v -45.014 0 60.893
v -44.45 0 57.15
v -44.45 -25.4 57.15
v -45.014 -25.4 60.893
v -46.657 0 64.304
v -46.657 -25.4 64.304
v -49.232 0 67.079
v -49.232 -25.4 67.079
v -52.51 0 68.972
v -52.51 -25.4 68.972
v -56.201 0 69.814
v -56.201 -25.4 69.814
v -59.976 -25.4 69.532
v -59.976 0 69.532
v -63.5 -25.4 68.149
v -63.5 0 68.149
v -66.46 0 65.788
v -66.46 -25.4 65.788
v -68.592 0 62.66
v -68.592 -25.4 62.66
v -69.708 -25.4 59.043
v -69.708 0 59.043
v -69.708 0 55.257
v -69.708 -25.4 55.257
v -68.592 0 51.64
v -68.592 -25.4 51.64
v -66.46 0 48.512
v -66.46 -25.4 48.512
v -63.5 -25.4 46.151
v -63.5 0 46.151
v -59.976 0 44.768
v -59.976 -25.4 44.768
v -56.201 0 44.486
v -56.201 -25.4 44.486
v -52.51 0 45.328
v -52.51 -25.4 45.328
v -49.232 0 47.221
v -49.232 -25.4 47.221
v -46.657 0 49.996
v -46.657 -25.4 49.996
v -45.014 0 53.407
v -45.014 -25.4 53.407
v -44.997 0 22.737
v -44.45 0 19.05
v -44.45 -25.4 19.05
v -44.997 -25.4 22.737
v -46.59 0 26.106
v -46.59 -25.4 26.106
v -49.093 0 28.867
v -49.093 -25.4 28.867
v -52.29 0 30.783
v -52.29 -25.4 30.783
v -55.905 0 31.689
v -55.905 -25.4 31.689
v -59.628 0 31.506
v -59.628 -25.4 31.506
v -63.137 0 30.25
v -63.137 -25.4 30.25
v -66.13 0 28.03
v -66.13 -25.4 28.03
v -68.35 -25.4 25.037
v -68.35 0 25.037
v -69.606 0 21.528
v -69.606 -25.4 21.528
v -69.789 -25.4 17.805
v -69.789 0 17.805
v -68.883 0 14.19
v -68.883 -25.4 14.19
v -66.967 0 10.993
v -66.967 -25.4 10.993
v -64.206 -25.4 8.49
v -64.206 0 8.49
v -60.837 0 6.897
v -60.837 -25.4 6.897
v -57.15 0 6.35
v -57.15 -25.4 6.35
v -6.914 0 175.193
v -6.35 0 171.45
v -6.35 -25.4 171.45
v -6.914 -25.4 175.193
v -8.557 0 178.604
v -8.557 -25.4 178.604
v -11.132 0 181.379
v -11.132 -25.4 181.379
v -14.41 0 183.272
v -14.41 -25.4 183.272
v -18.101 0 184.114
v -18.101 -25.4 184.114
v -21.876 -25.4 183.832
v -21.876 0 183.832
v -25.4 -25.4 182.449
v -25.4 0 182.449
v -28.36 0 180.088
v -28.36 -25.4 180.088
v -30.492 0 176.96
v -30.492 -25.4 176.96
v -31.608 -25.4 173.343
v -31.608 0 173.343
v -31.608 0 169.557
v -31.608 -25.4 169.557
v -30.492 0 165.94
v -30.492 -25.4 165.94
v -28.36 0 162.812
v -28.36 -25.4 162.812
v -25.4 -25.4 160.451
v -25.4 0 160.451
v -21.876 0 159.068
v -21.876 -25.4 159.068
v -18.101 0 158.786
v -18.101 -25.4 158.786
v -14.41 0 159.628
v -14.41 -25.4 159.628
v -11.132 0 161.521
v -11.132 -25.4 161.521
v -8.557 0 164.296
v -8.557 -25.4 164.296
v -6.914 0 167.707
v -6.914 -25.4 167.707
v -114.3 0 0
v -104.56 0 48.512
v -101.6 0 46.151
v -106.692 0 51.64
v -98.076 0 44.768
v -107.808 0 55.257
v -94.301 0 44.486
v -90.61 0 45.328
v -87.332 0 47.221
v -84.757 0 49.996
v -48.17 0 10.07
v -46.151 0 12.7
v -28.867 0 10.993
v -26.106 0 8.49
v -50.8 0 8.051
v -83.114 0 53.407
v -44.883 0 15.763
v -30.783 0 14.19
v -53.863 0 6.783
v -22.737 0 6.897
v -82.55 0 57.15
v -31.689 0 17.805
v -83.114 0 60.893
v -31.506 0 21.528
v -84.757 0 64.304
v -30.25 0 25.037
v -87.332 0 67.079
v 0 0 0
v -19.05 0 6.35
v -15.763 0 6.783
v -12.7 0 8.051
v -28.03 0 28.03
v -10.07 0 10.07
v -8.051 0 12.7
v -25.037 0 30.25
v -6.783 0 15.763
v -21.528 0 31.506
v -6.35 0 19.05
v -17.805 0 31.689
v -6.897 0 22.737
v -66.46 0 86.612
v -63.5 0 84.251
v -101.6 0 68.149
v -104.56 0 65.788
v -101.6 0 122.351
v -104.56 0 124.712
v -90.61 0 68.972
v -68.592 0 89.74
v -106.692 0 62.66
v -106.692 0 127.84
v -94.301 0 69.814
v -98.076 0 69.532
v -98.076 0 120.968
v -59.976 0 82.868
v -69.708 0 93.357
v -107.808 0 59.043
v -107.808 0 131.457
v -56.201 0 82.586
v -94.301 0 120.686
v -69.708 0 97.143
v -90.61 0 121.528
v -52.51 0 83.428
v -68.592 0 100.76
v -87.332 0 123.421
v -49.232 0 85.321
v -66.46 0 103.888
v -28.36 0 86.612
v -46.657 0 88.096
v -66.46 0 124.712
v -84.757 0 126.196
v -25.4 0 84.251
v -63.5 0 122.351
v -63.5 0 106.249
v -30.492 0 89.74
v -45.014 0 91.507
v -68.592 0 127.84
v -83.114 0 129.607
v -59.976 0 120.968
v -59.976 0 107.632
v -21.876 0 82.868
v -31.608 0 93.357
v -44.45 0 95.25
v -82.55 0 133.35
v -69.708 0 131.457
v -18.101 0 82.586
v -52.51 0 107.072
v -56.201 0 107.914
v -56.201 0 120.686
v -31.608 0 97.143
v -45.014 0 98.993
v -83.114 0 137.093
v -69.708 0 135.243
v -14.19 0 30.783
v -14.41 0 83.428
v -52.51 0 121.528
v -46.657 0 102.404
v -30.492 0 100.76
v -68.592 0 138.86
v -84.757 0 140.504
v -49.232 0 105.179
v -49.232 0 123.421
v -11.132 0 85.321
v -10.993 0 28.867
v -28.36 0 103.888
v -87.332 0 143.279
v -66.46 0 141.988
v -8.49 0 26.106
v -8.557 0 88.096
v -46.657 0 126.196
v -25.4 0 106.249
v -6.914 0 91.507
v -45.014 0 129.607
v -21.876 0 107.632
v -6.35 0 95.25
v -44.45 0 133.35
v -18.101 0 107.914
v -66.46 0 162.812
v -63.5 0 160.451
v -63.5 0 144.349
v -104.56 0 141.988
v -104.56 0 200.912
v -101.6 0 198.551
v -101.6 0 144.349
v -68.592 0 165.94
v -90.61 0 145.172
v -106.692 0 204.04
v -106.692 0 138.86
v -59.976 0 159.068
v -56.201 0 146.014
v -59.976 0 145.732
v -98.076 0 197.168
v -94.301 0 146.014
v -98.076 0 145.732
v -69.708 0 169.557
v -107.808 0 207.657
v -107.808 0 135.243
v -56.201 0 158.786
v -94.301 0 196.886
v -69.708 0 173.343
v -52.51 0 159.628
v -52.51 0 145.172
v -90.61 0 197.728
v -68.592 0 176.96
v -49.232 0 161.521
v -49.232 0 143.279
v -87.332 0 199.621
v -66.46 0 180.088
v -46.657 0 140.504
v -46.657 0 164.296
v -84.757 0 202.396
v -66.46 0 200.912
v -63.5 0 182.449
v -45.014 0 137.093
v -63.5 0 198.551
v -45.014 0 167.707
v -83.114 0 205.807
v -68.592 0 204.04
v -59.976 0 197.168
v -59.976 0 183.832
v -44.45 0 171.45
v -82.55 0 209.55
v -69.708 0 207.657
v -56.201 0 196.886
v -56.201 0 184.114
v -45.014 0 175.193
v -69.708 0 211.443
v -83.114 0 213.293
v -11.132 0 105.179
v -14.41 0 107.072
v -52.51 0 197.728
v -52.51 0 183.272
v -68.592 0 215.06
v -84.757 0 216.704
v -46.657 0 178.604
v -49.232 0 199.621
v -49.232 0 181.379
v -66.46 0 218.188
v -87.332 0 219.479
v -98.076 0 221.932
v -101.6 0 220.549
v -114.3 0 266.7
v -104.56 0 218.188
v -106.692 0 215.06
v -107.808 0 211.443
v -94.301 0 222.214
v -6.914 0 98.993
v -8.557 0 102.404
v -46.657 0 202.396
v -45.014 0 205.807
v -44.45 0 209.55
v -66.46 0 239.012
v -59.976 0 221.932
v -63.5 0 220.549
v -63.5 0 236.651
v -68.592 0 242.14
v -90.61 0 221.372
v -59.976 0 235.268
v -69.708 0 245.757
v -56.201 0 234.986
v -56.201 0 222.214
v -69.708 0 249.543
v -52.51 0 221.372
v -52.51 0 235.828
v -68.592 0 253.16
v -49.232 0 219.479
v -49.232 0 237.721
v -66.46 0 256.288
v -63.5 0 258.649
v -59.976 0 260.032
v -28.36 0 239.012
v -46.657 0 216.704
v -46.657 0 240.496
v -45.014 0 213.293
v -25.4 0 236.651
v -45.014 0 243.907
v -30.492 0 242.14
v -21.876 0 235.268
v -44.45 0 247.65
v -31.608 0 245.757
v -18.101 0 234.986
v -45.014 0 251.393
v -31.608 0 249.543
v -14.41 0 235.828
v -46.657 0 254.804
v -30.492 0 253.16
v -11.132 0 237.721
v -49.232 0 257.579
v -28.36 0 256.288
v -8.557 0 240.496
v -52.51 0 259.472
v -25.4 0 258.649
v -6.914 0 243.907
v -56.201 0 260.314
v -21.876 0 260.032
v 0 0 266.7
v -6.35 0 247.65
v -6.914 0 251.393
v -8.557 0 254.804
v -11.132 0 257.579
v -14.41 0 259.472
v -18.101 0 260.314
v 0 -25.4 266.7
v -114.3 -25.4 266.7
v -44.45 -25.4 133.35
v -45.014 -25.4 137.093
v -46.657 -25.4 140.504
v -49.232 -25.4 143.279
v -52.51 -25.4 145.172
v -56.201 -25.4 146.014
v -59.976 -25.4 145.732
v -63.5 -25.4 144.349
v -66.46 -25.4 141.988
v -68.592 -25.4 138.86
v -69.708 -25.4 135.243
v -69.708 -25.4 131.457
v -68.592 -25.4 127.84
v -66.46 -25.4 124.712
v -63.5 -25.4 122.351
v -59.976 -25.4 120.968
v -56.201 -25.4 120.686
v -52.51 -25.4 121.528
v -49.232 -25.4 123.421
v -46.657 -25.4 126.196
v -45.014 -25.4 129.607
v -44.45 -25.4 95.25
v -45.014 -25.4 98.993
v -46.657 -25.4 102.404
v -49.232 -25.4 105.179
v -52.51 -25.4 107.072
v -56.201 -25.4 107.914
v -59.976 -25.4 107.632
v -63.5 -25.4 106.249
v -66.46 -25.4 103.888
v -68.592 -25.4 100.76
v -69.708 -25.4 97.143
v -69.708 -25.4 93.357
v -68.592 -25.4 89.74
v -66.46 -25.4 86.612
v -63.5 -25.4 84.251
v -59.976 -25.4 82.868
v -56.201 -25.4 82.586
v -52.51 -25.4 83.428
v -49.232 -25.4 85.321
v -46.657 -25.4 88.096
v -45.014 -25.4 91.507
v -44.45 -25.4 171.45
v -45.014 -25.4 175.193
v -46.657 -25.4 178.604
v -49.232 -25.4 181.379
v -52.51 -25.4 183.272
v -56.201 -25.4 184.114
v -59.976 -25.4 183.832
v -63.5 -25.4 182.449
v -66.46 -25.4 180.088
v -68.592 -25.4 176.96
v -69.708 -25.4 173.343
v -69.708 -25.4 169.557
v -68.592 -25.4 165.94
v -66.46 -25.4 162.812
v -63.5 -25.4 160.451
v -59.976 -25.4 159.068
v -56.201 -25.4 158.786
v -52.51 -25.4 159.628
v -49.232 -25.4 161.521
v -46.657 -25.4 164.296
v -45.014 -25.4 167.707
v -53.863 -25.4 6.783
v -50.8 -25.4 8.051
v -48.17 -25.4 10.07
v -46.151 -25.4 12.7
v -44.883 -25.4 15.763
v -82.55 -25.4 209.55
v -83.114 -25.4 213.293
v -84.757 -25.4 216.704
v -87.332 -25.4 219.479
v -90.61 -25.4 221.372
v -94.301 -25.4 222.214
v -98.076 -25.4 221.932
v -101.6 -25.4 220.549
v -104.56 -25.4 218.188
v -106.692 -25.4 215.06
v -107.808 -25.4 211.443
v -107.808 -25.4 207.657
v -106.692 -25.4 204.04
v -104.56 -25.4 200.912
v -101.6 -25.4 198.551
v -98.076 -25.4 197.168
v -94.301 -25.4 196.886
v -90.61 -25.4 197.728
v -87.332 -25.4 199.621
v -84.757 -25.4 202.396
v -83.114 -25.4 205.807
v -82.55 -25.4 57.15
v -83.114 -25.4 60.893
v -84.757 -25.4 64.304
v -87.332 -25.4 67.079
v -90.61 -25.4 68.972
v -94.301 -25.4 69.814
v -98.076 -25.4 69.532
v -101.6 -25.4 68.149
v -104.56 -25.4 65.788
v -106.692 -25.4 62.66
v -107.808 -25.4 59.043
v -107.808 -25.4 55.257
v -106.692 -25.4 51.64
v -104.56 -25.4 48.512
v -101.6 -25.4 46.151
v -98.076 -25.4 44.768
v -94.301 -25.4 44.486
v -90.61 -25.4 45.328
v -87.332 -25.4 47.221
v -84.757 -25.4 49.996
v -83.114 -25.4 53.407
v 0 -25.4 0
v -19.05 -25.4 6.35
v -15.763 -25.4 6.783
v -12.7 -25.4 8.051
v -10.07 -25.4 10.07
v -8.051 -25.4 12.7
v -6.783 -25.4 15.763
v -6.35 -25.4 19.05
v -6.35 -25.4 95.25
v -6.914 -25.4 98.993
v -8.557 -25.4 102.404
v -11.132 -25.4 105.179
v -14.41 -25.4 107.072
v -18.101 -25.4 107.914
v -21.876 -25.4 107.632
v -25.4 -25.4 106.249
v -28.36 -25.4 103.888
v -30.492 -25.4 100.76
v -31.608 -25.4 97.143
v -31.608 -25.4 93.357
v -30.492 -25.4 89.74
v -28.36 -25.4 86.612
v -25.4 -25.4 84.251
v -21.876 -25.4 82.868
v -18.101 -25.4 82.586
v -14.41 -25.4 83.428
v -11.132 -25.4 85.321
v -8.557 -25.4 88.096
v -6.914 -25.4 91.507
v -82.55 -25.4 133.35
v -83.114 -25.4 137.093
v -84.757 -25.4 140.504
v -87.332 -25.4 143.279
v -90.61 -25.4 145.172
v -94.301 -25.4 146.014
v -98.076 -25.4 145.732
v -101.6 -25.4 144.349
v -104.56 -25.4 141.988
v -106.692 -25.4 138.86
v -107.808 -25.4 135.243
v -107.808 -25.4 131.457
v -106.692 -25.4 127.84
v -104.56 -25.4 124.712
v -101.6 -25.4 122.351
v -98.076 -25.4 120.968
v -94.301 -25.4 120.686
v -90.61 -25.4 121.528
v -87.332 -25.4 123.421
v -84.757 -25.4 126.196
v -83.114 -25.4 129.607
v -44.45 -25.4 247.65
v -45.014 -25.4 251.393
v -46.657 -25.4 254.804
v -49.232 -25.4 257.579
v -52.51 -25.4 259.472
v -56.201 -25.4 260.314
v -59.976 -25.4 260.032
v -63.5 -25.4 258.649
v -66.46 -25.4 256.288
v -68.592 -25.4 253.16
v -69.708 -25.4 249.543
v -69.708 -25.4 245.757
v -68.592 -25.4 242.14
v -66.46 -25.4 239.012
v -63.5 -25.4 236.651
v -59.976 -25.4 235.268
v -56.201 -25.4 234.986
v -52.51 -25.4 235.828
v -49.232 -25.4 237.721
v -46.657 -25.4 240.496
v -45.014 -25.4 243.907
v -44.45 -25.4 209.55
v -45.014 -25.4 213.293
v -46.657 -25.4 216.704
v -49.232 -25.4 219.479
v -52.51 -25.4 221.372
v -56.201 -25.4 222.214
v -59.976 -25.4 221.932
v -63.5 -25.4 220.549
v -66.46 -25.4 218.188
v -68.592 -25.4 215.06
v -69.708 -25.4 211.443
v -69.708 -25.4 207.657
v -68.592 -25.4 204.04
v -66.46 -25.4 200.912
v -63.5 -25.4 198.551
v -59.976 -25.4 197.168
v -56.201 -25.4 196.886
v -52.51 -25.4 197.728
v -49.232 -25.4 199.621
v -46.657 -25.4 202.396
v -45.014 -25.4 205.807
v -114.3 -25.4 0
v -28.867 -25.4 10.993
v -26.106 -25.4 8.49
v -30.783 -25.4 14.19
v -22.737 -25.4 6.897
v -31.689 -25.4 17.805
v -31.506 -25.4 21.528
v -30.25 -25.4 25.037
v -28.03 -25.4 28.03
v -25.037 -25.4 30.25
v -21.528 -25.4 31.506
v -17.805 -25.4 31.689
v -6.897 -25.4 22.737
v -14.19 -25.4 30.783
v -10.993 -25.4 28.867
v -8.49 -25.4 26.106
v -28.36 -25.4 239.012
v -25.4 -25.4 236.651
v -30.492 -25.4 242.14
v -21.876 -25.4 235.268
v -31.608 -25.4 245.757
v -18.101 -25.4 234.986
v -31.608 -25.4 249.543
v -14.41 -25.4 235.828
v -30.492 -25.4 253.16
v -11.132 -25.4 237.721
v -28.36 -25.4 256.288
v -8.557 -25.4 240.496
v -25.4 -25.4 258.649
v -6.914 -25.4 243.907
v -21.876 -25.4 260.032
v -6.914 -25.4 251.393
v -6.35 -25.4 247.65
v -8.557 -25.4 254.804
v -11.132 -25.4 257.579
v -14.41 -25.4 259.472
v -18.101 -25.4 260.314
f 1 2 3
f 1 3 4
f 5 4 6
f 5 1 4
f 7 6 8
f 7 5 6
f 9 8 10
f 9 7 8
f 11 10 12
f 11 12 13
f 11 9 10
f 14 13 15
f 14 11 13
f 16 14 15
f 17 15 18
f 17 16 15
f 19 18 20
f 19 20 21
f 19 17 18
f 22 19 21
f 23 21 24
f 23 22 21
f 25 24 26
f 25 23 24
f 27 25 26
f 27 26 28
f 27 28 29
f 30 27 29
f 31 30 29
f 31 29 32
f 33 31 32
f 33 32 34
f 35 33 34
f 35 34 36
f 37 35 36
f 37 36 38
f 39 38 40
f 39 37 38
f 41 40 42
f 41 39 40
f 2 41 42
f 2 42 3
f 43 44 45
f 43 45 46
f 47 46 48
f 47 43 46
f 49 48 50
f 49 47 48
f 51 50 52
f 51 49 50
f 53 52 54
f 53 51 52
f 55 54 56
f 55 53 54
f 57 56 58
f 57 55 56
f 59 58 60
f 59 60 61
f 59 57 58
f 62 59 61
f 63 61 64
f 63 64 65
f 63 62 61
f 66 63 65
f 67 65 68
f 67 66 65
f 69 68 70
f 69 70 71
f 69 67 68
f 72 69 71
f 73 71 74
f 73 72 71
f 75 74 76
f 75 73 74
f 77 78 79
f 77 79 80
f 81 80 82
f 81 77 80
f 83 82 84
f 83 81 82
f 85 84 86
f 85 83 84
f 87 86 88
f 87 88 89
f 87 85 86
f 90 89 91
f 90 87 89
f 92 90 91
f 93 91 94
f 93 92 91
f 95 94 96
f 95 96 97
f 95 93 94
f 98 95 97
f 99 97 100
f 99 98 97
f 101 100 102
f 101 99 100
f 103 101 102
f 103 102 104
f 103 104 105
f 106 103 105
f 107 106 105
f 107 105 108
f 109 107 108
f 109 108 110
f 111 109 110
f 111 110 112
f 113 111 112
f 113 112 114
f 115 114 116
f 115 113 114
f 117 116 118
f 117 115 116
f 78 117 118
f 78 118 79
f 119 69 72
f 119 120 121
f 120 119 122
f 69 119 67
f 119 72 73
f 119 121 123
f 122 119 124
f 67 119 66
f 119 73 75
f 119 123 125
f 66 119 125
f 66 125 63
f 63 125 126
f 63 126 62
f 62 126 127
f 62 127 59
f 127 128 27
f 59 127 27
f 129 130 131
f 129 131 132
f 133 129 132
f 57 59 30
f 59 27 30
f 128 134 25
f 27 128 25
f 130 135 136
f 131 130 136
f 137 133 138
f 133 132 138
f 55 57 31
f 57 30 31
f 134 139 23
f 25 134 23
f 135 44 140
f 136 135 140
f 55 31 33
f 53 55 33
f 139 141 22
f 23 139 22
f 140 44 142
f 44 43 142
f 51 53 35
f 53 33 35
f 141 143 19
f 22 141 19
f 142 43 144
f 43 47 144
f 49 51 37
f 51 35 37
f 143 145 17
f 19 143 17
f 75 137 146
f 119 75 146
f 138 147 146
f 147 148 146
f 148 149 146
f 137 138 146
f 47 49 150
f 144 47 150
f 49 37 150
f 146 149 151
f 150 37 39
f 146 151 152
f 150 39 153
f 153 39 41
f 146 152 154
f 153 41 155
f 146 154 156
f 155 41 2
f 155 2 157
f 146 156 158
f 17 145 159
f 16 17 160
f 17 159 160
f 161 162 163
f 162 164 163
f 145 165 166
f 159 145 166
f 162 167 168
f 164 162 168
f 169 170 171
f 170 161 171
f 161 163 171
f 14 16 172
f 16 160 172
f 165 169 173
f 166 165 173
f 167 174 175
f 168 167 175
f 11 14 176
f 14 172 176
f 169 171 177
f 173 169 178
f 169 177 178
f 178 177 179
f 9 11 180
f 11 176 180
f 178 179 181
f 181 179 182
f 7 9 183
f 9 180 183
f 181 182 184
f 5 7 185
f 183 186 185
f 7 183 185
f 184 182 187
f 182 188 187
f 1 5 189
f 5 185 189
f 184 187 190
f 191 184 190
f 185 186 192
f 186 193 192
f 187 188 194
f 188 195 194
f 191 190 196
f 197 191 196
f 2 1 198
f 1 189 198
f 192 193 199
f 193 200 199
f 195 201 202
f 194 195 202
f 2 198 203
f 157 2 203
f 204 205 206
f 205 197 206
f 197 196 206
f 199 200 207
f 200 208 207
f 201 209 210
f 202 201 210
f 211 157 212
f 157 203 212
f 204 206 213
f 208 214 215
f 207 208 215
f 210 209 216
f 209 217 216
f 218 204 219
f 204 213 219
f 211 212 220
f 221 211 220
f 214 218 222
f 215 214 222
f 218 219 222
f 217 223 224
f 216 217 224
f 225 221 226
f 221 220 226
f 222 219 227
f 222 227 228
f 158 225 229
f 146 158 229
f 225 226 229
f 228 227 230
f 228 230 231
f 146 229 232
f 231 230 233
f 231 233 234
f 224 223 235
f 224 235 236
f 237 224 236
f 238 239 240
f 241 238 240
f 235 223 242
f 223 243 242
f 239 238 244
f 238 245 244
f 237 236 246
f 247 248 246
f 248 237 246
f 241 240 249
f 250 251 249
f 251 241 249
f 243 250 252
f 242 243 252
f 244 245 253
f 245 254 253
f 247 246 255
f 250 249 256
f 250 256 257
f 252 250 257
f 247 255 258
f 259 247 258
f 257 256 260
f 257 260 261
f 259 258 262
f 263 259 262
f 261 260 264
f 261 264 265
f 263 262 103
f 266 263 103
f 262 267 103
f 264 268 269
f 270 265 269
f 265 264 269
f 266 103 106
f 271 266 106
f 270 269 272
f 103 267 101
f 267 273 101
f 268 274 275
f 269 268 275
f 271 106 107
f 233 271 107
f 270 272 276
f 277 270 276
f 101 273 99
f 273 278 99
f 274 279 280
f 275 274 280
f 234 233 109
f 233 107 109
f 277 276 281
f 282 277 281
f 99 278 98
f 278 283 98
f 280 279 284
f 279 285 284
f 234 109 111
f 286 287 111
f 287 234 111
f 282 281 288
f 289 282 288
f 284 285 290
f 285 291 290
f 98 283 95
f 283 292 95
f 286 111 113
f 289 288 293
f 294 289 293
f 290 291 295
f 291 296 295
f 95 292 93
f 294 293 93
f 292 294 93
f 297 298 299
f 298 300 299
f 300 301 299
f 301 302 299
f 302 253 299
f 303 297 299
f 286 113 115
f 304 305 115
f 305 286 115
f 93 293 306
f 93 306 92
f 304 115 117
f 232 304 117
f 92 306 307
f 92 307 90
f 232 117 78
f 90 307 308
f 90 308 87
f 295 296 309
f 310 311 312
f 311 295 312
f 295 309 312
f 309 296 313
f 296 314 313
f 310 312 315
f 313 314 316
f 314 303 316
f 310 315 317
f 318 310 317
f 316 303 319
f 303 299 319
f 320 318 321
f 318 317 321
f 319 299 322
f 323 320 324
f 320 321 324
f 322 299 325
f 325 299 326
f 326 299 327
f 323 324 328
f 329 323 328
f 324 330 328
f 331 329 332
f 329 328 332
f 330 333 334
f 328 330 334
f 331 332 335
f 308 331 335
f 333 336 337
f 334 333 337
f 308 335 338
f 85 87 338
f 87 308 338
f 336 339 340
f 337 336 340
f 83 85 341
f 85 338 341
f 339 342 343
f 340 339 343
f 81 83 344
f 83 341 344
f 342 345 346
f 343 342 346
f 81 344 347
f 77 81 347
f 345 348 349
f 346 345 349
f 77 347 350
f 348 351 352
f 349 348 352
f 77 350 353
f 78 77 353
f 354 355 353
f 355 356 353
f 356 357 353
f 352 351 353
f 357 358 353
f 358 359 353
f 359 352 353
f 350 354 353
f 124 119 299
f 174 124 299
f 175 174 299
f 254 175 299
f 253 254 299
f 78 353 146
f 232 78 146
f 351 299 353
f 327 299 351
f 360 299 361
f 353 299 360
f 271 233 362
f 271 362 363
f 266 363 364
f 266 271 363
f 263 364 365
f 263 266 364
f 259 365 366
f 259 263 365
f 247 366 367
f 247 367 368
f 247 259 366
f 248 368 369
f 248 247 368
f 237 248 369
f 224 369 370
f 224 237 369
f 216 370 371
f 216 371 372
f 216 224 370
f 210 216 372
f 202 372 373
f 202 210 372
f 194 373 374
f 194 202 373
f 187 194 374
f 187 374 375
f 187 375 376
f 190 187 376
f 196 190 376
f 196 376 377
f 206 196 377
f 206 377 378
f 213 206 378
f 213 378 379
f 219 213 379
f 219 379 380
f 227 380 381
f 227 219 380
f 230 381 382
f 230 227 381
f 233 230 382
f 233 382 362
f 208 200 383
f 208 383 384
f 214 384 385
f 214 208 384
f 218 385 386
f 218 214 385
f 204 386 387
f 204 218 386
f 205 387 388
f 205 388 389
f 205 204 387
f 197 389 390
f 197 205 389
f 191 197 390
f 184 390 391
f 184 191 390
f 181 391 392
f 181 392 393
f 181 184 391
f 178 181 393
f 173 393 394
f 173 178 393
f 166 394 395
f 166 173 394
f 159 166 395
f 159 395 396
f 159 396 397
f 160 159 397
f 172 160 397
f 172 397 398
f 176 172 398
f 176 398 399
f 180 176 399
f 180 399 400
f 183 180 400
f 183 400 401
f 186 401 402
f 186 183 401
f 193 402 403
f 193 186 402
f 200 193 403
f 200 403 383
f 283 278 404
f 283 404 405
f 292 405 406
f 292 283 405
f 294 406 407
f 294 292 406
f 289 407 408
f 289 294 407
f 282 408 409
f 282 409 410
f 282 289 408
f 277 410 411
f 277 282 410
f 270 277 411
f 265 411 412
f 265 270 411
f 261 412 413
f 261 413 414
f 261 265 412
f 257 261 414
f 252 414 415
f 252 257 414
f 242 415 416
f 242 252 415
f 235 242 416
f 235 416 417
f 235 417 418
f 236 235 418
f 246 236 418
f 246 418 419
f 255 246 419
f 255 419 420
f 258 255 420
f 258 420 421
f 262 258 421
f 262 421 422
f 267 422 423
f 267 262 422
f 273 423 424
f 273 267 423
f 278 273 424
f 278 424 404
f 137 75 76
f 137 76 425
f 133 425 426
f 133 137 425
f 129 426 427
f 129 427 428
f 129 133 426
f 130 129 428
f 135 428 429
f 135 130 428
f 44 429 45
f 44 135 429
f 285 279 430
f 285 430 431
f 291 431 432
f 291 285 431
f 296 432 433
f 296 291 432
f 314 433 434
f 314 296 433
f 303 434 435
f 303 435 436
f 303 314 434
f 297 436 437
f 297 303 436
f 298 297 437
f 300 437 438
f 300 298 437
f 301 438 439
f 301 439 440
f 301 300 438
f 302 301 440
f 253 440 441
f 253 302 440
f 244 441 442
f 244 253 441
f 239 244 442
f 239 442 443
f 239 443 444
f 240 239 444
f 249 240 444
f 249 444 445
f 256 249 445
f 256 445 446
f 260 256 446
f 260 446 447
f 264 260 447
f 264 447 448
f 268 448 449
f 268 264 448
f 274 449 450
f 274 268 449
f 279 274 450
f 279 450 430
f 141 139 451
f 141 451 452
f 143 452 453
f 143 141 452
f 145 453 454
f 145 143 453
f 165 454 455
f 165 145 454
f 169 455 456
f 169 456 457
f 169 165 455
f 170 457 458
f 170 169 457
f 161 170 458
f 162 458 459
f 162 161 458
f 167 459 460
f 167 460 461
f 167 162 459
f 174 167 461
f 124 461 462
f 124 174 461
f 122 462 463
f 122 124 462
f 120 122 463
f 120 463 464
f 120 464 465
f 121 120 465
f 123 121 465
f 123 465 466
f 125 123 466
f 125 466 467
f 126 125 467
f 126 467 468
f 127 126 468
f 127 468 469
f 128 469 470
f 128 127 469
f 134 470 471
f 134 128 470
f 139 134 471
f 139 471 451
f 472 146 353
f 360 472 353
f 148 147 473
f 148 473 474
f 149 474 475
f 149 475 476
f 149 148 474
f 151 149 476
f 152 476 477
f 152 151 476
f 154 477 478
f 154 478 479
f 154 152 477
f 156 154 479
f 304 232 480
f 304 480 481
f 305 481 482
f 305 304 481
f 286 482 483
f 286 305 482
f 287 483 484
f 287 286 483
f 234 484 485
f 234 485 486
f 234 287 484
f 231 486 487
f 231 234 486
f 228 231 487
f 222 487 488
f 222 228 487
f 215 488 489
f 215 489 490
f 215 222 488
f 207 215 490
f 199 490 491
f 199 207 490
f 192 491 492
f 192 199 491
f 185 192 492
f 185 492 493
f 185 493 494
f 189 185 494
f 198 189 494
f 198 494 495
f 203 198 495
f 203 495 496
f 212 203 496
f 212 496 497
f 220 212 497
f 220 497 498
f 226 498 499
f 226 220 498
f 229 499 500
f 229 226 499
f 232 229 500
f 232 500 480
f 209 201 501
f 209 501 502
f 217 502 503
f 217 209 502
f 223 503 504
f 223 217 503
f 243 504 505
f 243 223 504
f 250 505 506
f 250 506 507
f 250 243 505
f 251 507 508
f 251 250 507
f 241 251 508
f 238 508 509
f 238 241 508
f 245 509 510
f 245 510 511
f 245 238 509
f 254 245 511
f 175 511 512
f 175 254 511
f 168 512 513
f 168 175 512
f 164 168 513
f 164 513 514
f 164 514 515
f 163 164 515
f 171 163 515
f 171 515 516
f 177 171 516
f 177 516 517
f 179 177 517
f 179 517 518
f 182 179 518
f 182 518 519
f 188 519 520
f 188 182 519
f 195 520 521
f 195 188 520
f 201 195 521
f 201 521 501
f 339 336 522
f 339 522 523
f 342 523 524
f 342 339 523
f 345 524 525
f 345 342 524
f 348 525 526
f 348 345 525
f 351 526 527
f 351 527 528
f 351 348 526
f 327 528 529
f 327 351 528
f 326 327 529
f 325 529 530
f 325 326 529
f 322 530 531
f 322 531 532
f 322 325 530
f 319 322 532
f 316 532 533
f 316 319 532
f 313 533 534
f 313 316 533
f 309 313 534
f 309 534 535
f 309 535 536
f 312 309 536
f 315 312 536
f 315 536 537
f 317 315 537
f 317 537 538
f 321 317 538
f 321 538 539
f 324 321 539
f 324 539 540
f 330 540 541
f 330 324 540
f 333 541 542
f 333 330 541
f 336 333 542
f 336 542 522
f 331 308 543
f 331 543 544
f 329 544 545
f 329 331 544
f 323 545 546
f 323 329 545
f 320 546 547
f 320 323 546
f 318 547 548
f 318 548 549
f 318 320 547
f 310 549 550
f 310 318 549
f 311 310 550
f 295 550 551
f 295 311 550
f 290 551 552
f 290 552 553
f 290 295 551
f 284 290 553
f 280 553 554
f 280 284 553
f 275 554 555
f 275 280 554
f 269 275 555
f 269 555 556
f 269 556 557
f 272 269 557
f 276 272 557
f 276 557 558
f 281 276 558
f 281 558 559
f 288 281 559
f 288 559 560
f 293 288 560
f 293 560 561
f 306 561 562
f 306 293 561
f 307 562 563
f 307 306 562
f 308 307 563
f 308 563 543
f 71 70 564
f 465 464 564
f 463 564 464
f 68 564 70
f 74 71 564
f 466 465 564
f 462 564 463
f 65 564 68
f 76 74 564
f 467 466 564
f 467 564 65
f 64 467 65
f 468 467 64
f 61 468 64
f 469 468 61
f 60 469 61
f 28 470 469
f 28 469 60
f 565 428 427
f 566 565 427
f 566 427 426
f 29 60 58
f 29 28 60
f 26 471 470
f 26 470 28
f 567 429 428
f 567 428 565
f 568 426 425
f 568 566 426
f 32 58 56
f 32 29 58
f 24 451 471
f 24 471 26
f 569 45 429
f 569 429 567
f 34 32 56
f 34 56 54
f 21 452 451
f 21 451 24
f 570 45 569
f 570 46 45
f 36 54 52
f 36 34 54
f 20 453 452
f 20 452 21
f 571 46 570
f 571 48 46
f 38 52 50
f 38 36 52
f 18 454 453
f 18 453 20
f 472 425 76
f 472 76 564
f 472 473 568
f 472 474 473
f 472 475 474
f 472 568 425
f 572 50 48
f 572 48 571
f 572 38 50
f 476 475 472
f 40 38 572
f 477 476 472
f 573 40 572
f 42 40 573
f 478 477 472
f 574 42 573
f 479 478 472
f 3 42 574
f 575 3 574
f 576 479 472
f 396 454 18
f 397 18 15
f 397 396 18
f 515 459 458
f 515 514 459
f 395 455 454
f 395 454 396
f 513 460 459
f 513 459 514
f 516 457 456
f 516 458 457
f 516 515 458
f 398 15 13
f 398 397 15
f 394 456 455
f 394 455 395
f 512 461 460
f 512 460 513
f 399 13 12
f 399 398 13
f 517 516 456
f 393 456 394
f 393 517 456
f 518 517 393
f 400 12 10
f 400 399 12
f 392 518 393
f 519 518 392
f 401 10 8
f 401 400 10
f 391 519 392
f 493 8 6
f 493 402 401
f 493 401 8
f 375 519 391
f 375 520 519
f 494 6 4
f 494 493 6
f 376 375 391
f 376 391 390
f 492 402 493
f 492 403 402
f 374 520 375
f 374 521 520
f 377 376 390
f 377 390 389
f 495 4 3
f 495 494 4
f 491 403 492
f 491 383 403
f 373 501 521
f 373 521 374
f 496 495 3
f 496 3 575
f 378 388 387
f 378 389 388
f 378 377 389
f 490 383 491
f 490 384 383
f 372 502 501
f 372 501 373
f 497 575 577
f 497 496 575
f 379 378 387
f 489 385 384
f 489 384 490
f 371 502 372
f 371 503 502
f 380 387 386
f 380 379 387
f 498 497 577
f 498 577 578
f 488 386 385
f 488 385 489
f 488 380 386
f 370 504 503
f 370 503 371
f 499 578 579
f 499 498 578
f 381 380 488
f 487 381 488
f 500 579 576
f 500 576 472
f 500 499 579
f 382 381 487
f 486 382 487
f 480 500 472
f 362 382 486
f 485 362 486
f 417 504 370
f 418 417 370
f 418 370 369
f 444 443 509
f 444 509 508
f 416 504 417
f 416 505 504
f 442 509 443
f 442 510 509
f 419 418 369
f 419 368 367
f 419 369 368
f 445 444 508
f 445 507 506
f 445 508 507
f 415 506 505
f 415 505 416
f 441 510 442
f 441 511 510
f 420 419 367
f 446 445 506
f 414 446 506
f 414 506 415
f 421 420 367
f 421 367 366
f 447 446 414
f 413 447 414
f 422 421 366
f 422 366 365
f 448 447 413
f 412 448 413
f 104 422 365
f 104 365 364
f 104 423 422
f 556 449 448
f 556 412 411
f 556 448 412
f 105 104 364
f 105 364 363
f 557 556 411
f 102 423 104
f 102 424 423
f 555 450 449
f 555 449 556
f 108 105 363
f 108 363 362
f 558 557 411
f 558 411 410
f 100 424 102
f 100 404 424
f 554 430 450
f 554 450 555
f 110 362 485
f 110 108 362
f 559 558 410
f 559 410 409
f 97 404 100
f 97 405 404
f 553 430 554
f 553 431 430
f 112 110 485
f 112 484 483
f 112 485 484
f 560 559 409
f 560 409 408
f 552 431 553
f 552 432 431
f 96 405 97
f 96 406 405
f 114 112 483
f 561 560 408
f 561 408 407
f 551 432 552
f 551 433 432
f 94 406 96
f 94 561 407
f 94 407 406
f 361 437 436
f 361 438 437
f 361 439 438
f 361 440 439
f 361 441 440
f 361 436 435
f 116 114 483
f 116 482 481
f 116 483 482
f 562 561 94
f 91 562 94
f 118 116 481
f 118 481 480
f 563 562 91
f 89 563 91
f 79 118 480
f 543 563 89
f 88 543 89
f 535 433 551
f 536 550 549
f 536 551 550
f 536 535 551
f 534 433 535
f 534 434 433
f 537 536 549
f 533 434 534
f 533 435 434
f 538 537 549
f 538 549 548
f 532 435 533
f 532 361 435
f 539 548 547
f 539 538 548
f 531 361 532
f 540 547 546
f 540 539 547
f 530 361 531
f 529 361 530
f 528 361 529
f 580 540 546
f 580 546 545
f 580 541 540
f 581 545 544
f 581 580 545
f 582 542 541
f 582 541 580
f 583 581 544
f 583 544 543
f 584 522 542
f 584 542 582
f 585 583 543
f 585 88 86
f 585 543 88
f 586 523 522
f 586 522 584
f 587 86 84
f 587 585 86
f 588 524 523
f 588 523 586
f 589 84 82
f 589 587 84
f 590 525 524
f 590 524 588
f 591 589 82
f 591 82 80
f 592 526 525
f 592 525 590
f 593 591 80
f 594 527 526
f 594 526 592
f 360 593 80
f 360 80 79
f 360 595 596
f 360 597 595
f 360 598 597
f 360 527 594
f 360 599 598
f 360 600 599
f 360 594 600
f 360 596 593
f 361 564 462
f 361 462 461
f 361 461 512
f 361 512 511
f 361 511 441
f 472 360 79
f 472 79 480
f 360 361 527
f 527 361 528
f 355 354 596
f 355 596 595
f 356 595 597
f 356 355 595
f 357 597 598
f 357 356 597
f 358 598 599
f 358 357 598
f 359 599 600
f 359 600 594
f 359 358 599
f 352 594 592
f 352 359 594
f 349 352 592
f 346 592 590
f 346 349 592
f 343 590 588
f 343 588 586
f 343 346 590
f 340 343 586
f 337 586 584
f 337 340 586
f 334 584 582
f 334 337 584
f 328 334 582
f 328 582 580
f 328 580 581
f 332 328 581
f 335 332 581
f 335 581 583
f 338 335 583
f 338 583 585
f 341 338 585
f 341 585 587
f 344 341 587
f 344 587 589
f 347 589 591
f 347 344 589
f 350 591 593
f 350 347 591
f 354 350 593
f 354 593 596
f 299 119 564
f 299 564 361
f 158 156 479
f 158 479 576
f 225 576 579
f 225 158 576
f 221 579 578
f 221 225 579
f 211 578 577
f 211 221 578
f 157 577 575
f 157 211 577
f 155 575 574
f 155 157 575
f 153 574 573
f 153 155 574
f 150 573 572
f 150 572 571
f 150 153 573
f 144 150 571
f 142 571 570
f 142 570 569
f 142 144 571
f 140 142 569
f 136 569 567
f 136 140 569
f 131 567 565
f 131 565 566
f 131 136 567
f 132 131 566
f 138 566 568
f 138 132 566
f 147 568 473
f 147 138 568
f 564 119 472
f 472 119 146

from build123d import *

# Parameters (mm, degrees)
F0_W     = 114.3
F0_H     = 266.7
F2_DEPTH = 25.4
F1_R     = 12.7
F3_DEPTH = 25.4


with BuildPart() as f2:
    # F0 (on Front) → F2 (new body)
    with BuildSketch(Plane.XZ):
        with Locations((-57.15, 133.35)):
            Rectangle(F0_W, F0_H)
    extrude(amount=F2_DEPTH)

    # F1 (on Front) → F3 (cut)
    with BuildSketch(Plane.XZ):
        with BuildLine():
            ThreePointArc((-44.45, 19.05), (-66.130256, 28.030256), (-57.15, 6.35))
            ThreePointArc((-57.15, 6.35), (-48.169744, 10.069744), (-44.45, 19.05))
        make_face()
        with BuildLine():
            ThreePointArc((-6.35, 19.05), (-28.030256, 28.030256), (-19.05, 6.35))
            ThreePointArc((-19.05, 6.35), (-10.069744, 10.069744), (-6.35, 19.05))
        make_face()
        with Locations((-57.15, 57.15)):
            Circle(F1_R)
        with Locations((-95.25, 57.15)):
            Circle(F1_R)
        with Locations((-19.05, 95.25)):
            Circle(F1_R)
        with Locations((-57.15, 95.25)):
            Circle(F1_R)
        with Locations((-95.25, 133.35)):
            Circle(F1_R)
        with Locations((-57.15, 133.35)):
            Circle(F1_R)
        with Locations((-95.25, 209.55)):
            Circle(F1_R)
        with Locations((-57.15, 209.55)):
            Circle(F1_R)
        with Locations((-19.05, 171.45)):
            Circle(F1_R)
        with Locations((-57.15, 171.45)):
            Circle(F1_R)
        with Locations((-19.05, 247.65)):
            Circle(F1_R)
        with Locations((-57.15, 247.65)):
            Circle(F1_R)
    extrude(amount=F3_DEPTH, mode=Mode.SUBTRACT)


solid = f2.part
